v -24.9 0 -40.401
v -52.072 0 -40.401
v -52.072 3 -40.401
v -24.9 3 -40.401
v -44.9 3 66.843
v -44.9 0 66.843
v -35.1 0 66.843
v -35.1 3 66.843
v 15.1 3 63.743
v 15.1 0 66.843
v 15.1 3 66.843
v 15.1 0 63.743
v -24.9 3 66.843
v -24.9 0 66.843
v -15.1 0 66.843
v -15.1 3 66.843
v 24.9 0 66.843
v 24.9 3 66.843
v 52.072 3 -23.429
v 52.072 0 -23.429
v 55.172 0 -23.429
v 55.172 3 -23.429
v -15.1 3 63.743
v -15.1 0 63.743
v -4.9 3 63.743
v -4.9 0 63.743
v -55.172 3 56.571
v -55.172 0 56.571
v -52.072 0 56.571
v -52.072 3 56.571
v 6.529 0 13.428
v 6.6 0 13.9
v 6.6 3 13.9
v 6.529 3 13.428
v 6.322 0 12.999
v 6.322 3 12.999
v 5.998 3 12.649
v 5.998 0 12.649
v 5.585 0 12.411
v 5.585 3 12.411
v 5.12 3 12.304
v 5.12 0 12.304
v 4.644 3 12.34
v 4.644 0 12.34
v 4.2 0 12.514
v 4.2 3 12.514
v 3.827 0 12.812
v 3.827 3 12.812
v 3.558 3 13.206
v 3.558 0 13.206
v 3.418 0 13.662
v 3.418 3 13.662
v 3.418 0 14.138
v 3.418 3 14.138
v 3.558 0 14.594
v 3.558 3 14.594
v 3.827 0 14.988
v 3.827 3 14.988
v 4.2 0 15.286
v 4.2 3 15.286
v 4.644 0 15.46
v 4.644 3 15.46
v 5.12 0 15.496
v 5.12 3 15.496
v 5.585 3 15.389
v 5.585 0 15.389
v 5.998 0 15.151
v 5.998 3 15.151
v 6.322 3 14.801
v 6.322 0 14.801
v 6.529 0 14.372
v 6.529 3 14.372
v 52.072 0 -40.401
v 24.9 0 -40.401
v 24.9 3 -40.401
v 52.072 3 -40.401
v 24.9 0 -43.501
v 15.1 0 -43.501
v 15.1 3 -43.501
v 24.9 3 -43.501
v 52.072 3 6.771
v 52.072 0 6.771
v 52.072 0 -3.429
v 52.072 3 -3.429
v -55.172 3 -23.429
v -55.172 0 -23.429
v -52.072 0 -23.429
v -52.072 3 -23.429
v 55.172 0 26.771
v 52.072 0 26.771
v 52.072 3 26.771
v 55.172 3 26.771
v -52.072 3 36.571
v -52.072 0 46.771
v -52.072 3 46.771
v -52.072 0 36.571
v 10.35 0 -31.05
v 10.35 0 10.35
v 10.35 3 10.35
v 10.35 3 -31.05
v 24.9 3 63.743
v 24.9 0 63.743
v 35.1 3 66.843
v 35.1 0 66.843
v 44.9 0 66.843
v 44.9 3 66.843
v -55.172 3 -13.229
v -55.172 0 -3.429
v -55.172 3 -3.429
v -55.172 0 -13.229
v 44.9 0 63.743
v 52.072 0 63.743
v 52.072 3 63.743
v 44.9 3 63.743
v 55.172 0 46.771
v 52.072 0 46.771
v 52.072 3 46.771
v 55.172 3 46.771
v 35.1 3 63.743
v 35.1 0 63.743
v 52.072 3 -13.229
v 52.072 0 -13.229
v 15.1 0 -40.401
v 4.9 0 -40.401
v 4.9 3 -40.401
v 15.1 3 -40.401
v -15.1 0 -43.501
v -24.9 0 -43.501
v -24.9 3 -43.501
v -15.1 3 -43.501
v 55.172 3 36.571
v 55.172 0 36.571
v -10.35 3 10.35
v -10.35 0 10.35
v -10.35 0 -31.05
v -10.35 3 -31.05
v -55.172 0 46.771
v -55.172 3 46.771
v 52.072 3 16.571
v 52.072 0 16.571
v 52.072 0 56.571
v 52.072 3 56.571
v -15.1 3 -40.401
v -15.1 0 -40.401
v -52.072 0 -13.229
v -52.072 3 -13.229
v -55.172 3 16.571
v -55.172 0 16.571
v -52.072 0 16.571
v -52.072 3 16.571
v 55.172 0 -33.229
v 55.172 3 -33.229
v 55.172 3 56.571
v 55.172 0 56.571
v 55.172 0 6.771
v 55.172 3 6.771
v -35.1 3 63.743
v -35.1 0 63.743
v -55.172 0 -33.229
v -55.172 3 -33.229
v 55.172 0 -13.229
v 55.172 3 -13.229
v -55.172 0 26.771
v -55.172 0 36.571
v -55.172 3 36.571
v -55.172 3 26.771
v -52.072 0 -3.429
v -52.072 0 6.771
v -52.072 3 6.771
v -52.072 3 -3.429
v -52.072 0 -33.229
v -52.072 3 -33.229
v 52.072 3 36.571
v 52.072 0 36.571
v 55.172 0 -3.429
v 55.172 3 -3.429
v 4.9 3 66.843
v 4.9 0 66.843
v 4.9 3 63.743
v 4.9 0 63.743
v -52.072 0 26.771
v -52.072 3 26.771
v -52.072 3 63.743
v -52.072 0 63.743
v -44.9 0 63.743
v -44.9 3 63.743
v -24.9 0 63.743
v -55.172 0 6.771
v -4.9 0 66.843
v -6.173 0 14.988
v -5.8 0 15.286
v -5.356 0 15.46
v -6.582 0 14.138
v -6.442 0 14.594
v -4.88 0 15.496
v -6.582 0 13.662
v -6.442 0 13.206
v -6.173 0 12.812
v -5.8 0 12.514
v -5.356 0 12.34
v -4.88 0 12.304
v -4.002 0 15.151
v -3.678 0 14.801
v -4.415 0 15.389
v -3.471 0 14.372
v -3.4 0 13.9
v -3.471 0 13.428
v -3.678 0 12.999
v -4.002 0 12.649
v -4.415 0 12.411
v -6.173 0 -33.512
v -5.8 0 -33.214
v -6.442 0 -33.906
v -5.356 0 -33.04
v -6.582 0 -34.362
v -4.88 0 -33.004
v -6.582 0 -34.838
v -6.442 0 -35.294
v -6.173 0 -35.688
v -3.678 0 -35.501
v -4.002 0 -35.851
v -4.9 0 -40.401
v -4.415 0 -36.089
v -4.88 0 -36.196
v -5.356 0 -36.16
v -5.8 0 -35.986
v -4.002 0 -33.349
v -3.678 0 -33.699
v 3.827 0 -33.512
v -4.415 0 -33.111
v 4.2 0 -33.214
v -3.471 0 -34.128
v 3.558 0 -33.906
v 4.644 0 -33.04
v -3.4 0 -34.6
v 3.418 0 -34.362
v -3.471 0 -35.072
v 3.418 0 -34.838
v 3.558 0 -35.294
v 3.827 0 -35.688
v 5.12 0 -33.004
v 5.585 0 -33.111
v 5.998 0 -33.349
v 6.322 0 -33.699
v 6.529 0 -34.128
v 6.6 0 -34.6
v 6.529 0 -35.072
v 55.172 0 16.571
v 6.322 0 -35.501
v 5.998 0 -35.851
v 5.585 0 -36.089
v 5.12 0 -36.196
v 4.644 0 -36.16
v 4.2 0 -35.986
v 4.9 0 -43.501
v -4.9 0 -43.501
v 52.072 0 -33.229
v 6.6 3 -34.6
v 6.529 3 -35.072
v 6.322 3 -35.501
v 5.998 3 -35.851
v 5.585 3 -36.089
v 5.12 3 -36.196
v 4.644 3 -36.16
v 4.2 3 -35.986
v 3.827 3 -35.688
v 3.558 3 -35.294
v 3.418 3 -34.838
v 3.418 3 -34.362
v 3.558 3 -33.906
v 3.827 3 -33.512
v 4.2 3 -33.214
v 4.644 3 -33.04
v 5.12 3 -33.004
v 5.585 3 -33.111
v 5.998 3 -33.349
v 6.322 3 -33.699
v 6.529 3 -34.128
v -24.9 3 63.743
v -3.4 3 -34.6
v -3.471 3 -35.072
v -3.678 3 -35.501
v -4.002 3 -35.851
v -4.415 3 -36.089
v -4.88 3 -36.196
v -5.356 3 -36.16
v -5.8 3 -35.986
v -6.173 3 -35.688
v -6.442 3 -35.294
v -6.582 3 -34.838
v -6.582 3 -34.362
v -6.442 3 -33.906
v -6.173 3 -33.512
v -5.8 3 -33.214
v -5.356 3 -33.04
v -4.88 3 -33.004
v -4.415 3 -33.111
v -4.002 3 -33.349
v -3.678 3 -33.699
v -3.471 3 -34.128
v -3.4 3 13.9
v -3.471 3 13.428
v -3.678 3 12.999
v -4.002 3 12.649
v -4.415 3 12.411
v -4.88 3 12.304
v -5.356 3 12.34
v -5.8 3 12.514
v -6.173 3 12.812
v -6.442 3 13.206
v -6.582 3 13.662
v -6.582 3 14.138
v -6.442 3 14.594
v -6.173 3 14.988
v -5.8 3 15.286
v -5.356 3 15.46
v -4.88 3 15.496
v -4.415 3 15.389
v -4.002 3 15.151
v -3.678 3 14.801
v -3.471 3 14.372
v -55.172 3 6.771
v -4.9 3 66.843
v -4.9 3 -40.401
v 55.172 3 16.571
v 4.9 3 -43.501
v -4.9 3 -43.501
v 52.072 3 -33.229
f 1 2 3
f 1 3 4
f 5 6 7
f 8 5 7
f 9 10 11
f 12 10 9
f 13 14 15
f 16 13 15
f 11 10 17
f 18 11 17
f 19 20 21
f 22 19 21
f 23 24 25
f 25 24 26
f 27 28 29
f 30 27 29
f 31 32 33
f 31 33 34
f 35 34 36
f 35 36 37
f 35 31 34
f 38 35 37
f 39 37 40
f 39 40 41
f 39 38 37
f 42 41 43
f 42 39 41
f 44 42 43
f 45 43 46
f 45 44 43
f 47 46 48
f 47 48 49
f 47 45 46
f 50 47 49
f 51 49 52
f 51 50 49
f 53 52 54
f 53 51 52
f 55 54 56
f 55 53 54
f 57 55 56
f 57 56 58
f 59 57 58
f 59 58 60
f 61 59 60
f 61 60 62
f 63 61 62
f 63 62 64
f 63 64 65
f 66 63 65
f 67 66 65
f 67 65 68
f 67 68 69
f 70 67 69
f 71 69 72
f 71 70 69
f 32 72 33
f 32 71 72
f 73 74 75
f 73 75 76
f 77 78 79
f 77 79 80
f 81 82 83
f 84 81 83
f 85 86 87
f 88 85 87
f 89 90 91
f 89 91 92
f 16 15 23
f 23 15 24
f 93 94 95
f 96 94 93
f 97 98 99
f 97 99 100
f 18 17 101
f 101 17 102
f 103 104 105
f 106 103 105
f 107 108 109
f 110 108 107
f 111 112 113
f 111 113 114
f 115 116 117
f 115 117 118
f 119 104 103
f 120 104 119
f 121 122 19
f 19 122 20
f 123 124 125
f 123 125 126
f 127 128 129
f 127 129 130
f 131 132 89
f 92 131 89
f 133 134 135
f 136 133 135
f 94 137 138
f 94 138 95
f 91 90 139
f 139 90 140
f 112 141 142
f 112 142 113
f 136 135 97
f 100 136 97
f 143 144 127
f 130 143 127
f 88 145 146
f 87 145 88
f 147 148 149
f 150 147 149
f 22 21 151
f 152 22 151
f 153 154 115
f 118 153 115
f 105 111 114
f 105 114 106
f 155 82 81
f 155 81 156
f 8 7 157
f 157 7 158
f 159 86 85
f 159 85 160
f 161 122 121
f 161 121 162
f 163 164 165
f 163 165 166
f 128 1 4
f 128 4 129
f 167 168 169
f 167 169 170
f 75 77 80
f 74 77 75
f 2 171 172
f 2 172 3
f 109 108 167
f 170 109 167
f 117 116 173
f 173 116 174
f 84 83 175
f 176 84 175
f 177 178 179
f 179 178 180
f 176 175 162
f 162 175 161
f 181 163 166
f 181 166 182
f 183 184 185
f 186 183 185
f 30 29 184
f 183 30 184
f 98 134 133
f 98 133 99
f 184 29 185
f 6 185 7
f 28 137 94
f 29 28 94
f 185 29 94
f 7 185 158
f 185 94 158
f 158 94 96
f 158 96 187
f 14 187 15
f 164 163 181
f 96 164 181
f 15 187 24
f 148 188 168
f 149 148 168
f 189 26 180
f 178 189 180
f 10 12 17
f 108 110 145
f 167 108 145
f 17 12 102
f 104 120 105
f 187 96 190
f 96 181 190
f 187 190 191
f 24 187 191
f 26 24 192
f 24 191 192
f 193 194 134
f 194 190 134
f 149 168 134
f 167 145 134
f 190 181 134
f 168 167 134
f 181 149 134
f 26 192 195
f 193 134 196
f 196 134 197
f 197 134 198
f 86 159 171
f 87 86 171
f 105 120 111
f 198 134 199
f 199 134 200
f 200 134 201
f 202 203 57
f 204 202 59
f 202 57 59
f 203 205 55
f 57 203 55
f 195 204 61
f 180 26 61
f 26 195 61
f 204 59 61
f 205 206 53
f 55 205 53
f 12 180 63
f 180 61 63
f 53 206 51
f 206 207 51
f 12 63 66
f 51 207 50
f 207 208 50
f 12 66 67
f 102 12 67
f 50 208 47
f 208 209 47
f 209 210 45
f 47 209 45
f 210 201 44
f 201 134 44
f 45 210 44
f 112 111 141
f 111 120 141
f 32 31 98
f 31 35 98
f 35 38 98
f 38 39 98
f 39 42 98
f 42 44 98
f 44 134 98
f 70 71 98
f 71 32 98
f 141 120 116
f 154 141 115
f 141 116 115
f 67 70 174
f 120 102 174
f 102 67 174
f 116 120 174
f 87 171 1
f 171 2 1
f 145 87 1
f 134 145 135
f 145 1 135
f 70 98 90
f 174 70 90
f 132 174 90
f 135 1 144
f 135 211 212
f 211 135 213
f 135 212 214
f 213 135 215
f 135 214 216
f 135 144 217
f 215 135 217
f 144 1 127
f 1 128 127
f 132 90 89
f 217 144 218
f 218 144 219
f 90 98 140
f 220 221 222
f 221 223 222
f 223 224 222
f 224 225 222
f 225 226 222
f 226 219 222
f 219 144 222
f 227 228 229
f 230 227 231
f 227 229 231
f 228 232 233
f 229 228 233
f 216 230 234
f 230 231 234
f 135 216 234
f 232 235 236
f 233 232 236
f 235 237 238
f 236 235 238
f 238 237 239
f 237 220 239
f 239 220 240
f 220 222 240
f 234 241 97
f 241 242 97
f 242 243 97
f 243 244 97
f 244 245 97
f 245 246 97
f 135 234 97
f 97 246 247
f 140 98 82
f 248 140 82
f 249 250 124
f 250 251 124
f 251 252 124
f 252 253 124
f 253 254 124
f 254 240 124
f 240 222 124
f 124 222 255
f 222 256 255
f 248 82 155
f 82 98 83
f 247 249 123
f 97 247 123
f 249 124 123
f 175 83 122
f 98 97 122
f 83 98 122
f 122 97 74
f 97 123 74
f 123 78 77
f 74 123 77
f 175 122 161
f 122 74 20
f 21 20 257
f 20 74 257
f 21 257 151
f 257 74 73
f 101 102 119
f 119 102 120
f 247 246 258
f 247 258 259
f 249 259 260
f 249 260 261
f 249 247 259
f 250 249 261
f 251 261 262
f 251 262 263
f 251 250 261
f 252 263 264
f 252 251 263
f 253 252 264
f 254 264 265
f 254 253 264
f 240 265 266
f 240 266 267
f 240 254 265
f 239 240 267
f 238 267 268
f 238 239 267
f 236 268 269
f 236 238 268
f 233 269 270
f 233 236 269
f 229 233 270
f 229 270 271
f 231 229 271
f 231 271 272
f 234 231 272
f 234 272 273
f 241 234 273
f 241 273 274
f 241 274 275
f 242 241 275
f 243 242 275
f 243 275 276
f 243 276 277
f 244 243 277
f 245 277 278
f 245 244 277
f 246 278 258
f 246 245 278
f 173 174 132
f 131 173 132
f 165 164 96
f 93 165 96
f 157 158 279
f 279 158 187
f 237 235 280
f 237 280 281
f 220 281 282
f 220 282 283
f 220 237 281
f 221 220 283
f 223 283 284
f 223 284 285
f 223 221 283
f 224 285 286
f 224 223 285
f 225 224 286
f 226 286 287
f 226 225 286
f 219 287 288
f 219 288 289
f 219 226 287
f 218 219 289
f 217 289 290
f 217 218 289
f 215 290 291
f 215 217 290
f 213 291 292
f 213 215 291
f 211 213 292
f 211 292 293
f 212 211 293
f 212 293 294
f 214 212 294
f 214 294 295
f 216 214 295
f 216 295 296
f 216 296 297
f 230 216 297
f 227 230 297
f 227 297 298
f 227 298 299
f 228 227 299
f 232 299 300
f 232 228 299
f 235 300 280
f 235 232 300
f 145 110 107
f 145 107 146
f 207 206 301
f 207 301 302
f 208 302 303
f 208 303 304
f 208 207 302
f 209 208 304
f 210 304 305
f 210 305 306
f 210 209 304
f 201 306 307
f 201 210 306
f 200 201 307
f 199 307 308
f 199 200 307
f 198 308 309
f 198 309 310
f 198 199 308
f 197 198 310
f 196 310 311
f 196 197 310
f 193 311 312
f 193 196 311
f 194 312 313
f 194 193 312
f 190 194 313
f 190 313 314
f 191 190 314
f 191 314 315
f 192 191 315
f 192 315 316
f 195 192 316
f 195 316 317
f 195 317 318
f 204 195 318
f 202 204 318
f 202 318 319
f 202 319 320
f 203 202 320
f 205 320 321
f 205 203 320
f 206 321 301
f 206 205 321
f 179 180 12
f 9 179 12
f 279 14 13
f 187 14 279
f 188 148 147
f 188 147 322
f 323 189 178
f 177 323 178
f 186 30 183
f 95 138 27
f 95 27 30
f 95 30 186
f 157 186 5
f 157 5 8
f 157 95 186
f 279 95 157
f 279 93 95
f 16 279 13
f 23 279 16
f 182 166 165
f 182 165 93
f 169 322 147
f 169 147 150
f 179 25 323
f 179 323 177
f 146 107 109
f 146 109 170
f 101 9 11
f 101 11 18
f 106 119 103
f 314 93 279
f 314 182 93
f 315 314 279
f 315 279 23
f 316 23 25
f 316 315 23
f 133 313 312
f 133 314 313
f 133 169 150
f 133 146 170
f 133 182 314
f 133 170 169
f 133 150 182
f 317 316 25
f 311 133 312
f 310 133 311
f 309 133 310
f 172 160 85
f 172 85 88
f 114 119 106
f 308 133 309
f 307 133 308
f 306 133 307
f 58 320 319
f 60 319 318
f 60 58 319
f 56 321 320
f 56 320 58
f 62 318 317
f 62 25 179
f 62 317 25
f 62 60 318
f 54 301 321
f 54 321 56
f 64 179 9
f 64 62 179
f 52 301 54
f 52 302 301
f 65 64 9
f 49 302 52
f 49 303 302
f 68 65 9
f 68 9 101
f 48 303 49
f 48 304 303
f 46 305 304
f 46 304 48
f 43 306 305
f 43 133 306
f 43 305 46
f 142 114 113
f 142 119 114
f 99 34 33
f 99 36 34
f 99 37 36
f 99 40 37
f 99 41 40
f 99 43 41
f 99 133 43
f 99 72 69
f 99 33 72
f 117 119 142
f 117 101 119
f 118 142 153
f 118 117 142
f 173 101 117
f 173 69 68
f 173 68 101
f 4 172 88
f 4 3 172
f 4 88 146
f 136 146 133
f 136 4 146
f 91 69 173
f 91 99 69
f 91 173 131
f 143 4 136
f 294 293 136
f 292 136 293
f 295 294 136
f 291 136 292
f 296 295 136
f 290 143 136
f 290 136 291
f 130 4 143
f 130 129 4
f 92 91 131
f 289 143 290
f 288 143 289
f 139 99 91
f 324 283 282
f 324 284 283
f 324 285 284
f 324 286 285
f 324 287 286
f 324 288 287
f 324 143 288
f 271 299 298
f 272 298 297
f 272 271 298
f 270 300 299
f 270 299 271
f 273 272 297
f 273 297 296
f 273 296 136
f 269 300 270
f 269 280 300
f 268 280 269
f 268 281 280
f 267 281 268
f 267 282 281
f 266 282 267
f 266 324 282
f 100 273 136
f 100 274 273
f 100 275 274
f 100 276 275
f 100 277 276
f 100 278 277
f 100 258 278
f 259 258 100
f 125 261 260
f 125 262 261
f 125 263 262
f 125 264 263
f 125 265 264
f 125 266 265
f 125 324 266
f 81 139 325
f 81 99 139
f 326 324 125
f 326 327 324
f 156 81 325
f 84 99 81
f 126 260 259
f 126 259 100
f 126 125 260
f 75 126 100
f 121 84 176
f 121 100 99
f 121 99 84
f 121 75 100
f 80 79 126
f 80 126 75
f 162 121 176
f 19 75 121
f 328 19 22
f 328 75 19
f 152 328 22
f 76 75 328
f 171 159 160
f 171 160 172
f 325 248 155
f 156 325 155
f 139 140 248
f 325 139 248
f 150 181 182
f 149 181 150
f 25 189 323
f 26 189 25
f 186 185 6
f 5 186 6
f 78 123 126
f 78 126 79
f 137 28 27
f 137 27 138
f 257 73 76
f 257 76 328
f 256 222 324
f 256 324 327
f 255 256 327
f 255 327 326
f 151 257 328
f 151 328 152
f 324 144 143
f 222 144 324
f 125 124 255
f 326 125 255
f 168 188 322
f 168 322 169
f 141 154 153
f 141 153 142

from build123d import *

# Parameters (mm, degrees)
SKETCH1_W           = 110.344434204
SKETCH1_H           = 110.344434204
SKETCH1_R           = 1.6
SKETCH1_W_2         = 20.7
SKETCH1_H_2         = 41.4
BOSS_EXTRUDE1_DEPTH = 3
SKETCH3_W           = 3.2
SKETCH3_H           = 10.2
SKETCH3_W_2         = 10.2
SKETCH3_H_2         = 3.2
CUT_EXTRUDE1_DEPTH  = 4


with BuildPart() as part:
    # Sketch1 → Boss-Extrude1 (new body)
    with BuildSketch(Plane(origin=(0, 0, 0), x_dir=(1, 0, 0), z_dir=(0, 1, 0))):
        with Locations((0, -11.670773756)):
            Rectangle(SKETCH1_W, SKETCH1_H)
        with Locations((-5, 34.6)):
            Circle(SKETCH1_R, mode=Mode.SUBTRACT)
        with Locations((5, 34.6)):
            Circle(SKETCH1_R, mode=Mode.SUBTRACT)
        with Locations((5, -13.9)):
            Circle(SKETCH1_R, mode=Mode.SUBTRACT)
        with Locations((-5, -13.9)):
            Circle(SKETCH1_R, mode=Mode.SUBTRACT)
        with Locations((0, 10.35)):
            Rectangle(SKETCH1_W_2, SKETCH1_H_2, mode=Mode.SUBTRACT)
    extrude(amount=BOSS_EXTRUDE1_DEPTH)

    # Sketch3 → Cut-Extrude1 (cut, through all)
    with BuildSketch(Plane(origin=(0, 0, 0), x_dir=(1, 0, 0), z_dir=(0, 1, 0))):
        Polygon((-55.272217102, 43.601443346), (-55.272217102, 33.229226244), (-52.072217102, 33.229226244), (-52.072217102, 40.401443346), (-24.9, 40.401443346), (-24.9, 43.601443346), align=None)
        with Locations((-53.672217102, -1.670773756)):
            Rectangle(SKETCH3_W, SKETCH3_H)
        with Locations((-53.672217102, 18.329226244)):
            Rectangle(SKETCH3_W, SKETCH3_H)
        with Locations((-10, 42.001443346)):
            Rectangle(SKETCH3_W_2, SKETCH3_H_2)
        with Locations((-10, -65.342990858)):
            Rectangle(SKETCH3_W_2, SKETCH3_H_2)
        with Locations((-30, -65.342990858)):
            Rectangle(SKETCH3_W_2, SKETCH3_H_2)
        Polygon((-55.272217102, -56.570773756), (-52.072217102, -56.570773756), (-52.072217102, -63.742990858), (-44.9, -63.742990858), (-44.9, -66.942990858), (-55.272217102, -66.942990858), align=None)
        with Locations((-53.672217102, -21.670773756)):
            Rectangle(SKETCH3_W, SKETCH3_H)
        with Locations((-53.672217102, -41.670773756)):
            Rectangle(SKETCH3_W, SKETCH3_H)
        with Locations((30, -65.342990858)):
            Rectangle(SKETCH3_W_2, SKETCH3_H_2)
        with Locations((10, -65.342990858)):
            Rectangle(SKETCH3_W_2, SKETCH3_H_2)
        with Locations((53.672217102, -41.670773756)):
            Rectangle(SKETCH3_W, SKETCH3_H)
        with Locations((53.672217102, -21.670773756)):
            Rectangle(SKETCH3_W, SKETCH3_H)
        Polygon((52.072217102, -56.570773756), (52.072217102, -63.742990858), (44.9, -63.742990858), (44.9, -66.942990858), (55.272217102, -66.942990858), (55.272217102, -56.570773756), align=None)
        with Locations((53.672217102, -1.670773756)):
            Rectangle(SKETCH3_W, SKETCH3_H)
        with Locations((53.672217102, 18.329226244)):
            Rectangle(SKETCH3_W, SKETCH3_H)
        Polygon((24.9, 43.601443346), (24.9, 40.401443346), (52.072217102, 40.401443346), (52.072217102, 33.229226244), (55.272217102, 33.229226244), (55.272217102, 43.601443346), align=None)
        with Locations((10, 42.001443346)):
            Rectangle(SKETCH3_W_2, SKETCH3_H_2)
    extrude(amount=CUT_EXTRUDE1_DEPTH, mode=Mode.SUBTRACT)


solid = part.part
